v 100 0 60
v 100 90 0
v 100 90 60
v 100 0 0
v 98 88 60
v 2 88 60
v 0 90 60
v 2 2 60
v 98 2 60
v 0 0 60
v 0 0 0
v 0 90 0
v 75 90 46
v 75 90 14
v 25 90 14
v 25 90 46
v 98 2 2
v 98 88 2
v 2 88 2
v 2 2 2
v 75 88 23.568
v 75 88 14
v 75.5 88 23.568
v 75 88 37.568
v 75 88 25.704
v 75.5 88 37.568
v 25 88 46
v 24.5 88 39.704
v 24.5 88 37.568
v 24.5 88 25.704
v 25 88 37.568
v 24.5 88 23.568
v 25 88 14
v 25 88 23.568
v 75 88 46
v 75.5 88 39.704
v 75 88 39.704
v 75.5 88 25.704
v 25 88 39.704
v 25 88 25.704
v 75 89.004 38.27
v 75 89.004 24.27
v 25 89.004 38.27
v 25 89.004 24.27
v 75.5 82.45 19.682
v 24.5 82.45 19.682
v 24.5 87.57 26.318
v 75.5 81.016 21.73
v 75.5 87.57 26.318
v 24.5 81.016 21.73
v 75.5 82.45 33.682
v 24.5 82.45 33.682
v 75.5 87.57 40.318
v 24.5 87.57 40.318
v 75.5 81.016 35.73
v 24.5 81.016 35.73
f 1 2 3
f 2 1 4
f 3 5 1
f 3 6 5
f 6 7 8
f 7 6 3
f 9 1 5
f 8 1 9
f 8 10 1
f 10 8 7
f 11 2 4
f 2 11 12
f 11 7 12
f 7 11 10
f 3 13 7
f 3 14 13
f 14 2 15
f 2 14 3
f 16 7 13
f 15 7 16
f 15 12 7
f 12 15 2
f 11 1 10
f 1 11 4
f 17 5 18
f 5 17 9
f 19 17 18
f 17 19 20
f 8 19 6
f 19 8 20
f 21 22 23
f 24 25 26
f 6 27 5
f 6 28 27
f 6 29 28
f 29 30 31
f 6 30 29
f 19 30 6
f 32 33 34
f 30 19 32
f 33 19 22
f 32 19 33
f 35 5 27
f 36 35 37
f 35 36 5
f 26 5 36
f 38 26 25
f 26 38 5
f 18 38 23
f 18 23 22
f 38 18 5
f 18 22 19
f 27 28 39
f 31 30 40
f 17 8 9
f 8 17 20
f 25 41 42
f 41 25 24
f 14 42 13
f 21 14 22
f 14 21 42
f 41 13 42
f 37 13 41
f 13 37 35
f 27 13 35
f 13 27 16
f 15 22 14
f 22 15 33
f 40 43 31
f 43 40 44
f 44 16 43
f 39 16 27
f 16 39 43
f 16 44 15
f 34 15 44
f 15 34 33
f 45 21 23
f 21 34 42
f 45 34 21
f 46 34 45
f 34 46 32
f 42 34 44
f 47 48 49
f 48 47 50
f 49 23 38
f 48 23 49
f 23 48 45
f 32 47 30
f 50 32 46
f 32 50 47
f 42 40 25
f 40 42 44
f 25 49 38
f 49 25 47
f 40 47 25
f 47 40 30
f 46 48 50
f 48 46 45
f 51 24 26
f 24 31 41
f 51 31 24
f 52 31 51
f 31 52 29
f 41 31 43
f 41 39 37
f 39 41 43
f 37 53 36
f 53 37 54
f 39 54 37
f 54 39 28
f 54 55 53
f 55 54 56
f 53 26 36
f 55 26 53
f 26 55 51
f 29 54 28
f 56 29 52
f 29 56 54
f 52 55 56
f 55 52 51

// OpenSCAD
$fn = 32;

// ----------------------------------------------------------------------
// Vent box: louvers enclosure
// ----------------------------------------------------------------------

// --- parameters (mm) ---
box_l = 100;              // box length, X
box_w = 90;               // box width, Y
box_h = 60;               // box height, Z
wall_t = 2;               // shell wall thickness
win_l = 50;               // vent window width, X
win_h = 32;               // vent window height, Z
slat_t = 2.5;             // louver slat thickness
slat_d = 8;               // louver slat depth
slat_a = 35;              // louver slat angle, degrees
slat_pitch = 14;          // louver pitch
slat_yc = 85.01;          // slat centreline Y

win_z0 = (box_h - win_h) / 2;  // window lower edge Z
n_slats = 2;  // louver count
slat_z0 = win_z0 + (win_h - (n_slats - 1) * slat_pitch) / 2;

difference() {
  union() {
    difference() {
      cube([box_l, box_w, box_h]);
  translate([wall_t, wall_t, wall_t])
    cube([box_l - 2 * wall_t, box_w - 2 * wall_t, box_h]);
  translate([(box_l - win_l) / 2, box_w - wall_t - 1, win_z0])
    cube([win_l, wall_t + 2, win_h]);
    }
    for (i = [0 : n_slats - 1])
      translate([box_l / 2, slat_yc, slat_z0 + i * slat_pitch])
        rotate([slat_a, 0, 0])
          cube([win_l + 1, slat_d, slat_t], center = true);
  }
}
